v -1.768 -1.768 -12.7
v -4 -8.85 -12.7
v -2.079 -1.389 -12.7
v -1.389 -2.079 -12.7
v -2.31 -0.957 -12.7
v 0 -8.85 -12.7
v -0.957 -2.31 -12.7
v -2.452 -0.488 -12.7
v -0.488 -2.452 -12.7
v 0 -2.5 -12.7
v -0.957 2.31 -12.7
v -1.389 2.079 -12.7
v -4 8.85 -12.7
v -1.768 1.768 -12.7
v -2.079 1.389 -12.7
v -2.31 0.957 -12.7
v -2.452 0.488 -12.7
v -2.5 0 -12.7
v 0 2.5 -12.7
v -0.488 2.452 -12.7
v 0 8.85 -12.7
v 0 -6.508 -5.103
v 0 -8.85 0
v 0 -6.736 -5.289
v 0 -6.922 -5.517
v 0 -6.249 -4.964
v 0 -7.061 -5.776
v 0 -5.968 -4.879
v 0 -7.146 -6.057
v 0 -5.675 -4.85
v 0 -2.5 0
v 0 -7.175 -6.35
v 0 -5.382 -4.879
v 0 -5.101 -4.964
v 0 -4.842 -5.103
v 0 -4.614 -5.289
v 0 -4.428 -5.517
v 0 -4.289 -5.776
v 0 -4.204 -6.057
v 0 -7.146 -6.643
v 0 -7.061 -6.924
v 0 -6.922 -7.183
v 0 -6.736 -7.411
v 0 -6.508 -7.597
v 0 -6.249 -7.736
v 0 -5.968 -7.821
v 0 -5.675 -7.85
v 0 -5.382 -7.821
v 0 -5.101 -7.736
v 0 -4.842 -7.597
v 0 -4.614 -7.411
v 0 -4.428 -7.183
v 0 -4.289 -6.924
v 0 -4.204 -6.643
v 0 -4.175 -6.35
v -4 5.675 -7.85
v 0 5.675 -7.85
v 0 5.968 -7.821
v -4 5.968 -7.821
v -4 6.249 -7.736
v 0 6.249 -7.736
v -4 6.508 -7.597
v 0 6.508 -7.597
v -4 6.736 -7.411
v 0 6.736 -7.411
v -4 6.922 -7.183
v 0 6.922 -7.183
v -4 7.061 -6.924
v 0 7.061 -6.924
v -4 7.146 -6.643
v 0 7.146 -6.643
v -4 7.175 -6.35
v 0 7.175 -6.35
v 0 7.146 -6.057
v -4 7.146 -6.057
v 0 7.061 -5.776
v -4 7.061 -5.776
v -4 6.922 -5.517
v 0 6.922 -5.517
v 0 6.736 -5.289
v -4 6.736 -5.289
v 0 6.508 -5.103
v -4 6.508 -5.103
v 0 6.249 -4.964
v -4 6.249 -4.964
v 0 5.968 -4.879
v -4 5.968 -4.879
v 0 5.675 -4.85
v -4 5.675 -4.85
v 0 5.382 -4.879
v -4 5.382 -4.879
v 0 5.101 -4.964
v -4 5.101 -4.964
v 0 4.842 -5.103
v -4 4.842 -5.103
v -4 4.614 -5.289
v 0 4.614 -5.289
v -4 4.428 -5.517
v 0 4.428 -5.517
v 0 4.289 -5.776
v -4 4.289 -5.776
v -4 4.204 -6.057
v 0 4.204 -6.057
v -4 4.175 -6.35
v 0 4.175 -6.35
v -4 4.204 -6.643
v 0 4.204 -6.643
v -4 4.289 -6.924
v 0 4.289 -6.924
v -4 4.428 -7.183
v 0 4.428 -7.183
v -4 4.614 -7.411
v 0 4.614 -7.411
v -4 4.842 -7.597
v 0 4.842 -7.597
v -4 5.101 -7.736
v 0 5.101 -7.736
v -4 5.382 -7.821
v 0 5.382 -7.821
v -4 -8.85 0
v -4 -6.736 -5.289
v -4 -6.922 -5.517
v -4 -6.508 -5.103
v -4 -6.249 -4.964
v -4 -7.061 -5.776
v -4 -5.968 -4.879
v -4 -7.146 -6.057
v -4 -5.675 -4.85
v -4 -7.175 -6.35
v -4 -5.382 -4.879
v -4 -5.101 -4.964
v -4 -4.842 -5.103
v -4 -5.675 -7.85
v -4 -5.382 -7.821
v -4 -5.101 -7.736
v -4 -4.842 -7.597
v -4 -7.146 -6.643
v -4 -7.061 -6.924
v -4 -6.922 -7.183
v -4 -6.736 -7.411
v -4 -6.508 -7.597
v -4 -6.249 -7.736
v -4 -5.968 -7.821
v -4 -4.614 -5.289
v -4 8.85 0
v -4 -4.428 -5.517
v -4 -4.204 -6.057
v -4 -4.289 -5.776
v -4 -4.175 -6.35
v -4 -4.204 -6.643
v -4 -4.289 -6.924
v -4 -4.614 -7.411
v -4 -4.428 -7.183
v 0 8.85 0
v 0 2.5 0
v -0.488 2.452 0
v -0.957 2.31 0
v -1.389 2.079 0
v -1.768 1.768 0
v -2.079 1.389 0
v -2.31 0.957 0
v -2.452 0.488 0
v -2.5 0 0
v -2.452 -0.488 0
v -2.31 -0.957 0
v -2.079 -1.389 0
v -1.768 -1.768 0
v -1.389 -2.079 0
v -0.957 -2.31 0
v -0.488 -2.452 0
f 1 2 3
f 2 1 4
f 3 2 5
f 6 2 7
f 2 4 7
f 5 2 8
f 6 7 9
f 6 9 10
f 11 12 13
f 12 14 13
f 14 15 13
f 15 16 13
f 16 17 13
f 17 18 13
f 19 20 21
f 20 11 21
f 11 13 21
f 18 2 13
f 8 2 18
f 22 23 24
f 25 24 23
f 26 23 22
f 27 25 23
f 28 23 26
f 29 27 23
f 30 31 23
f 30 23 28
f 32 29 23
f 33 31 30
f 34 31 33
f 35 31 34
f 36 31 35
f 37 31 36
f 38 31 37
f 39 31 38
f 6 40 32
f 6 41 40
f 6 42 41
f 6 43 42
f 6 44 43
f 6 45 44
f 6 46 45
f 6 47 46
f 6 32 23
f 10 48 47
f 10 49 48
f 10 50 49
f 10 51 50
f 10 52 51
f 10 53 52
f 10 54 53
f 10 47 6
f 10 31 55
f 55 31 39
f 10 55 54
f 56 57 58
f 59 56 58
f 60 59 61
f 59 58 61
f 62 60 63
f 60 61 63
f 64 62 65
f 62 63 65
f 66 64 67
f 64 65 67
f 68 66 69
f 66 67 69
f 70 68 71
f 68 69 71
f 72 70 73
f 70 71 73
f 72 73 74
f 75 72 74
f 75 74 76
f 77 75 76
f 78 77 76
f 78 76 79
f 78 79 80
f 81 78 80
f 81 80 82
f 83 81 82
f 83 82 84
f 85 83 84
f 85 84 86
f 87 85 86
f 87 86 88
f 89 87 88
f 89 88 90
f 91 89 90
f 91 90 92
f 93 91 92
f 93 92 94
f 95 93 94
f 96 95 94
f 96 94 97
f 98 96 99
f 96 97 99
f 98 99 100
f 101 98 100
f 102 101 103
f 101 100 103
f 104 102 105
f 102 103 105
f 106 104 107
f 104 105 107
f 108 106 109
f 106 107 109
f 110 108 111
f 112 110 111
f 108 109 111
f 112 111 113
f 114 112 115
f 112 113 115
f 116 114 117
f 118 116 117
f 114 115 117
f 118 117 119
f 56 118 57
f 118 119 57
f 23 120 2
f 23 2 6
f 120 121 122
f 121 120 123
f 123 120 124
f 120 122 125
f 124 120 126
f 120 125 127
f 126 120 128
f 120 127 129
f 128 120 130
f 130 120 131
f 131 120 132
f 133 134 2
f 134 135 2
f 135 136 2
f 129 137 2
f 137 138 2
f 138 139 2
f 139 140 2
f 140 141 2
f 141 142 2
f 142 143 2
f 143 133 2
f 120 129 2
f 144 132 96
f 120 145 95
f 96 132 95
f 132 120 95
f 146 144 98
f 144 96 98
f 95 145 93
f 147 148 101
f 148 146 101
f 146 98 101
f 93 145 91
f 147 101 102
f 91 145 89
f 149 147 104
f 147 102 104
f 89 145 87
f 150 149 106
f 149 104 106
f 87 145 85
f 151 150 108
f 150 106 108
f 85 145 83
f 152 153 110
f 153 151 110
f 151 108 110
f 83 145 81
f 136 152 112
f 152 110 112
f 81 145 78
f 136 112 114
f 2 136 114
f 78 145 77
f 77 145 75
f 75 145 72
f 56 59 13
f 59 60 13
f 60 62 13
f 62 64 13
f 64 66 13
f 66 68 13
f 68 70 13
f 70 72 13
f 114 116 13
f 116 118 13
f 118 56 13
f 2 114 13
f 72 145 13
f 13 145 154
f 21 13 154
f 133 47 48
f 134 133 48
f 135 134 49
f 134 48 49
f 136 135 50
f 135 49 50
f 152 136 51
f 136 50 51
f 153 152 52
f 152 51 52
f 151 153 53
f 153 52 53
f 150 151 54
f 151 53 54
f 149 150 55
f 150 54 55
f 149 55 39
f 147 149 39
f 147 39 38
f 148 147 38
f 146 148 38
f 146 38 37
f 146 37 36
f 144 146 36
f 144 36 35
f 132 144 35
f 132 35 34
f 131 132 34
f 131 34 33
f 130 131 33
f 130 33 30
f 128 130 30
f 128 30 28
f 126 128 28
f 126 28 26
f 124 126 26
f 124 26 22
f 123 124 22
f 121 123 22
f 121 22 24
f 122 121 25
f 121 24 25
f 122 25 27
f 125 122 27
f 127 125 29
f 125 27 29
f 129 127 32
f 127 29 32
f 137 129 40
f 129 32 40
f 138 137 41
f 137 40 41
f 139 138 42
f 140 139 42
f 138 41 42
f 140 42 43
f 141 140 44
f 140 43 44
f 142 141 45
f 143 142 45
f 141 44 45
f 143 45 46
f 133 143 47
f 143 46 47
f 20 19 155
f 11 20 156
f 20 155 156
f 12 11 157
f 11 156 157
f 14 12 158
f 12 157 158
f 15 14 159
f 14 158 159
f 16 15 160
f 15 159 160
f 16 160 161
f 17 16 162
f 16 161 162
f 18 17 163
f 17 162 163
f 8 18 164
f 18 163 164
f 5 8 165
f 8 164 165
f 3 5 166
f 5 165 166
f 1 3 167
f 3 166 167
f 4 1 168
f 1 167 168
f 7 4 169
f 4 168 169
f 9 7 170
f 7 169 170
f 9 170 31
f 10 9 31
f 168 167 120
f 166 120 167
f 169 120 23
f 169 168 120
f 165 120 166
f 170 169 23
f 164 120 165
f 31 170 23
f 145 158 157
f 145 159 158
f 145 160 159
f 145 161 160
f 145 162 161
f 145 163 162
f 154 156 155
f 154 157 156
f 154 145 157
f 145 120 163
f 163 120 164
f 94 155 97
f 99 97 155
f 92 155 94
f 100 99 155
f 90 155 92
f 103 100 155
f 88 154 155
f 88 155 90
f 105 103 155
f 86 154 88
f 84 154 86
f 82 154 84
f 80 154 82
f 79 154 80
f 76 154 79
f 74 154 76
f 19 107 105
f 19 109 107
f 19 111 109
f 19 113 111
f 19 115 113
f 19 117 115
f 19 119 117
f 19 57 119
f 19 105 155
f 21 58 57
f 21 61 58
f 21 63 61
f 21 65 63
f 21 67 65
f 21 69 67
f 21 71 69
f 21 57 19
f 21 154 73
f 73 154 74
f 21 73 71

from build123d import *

# Parameters (mm, degrees)
SKETCH1_W           = 4
SKETCH1_H           = 12.7
BOSS_EXTRUDE1_DEPTH = 8.85
SKETCH2_R           = 2.5
CUT_EXTRUDE1_DEPTH  = 16.987886039
SKETCH3_R           = 1.5
CUT_EXTRUDE2_DEPTH  = 16.987886039


with BuildPart() as part:
    # Sketch1 → Boss-Extrude1 (new, symmetric)
    with BuildSketch(Plane(origin=(0, 0, 0), x_dir=(1, 0, 0), z_dir=(0, 1, 0))):
        with Locations((-2, 6.35)):
            Rectangle(SKETCH1_W, SKETCH1_H)
    extrude(amount=BOSS_EXTRUDE1_DEPTH, both=True)

    # Sketch2 → Cut-Extrude1 (cut, through all)
    with BuildSketch(Plane.XY):
        Circle(SKETCH2_R)
    extrude(amount=-CUT_EXTRUDE1_DEPTH, mode=Mode.SUBTRACT)

    # Sketch3 → Cut-Extrude2 (cut, through all)
    with BuildSketch(Plane(origin=(0, 0, 0), x_dir=(0, 0, -1), z_dir=(1, 0, 0))):
        with Locations((6.35, 5.675)):
            Circle(SKETCH3_R)
        with Locations((6.35, -5.675)):
            Circle(SKETCH3_R)
    extrude(amount=-CUT_EXTRUDE2_DEPTH, mode=Mode.SUBTRACT)


solid = part.part
